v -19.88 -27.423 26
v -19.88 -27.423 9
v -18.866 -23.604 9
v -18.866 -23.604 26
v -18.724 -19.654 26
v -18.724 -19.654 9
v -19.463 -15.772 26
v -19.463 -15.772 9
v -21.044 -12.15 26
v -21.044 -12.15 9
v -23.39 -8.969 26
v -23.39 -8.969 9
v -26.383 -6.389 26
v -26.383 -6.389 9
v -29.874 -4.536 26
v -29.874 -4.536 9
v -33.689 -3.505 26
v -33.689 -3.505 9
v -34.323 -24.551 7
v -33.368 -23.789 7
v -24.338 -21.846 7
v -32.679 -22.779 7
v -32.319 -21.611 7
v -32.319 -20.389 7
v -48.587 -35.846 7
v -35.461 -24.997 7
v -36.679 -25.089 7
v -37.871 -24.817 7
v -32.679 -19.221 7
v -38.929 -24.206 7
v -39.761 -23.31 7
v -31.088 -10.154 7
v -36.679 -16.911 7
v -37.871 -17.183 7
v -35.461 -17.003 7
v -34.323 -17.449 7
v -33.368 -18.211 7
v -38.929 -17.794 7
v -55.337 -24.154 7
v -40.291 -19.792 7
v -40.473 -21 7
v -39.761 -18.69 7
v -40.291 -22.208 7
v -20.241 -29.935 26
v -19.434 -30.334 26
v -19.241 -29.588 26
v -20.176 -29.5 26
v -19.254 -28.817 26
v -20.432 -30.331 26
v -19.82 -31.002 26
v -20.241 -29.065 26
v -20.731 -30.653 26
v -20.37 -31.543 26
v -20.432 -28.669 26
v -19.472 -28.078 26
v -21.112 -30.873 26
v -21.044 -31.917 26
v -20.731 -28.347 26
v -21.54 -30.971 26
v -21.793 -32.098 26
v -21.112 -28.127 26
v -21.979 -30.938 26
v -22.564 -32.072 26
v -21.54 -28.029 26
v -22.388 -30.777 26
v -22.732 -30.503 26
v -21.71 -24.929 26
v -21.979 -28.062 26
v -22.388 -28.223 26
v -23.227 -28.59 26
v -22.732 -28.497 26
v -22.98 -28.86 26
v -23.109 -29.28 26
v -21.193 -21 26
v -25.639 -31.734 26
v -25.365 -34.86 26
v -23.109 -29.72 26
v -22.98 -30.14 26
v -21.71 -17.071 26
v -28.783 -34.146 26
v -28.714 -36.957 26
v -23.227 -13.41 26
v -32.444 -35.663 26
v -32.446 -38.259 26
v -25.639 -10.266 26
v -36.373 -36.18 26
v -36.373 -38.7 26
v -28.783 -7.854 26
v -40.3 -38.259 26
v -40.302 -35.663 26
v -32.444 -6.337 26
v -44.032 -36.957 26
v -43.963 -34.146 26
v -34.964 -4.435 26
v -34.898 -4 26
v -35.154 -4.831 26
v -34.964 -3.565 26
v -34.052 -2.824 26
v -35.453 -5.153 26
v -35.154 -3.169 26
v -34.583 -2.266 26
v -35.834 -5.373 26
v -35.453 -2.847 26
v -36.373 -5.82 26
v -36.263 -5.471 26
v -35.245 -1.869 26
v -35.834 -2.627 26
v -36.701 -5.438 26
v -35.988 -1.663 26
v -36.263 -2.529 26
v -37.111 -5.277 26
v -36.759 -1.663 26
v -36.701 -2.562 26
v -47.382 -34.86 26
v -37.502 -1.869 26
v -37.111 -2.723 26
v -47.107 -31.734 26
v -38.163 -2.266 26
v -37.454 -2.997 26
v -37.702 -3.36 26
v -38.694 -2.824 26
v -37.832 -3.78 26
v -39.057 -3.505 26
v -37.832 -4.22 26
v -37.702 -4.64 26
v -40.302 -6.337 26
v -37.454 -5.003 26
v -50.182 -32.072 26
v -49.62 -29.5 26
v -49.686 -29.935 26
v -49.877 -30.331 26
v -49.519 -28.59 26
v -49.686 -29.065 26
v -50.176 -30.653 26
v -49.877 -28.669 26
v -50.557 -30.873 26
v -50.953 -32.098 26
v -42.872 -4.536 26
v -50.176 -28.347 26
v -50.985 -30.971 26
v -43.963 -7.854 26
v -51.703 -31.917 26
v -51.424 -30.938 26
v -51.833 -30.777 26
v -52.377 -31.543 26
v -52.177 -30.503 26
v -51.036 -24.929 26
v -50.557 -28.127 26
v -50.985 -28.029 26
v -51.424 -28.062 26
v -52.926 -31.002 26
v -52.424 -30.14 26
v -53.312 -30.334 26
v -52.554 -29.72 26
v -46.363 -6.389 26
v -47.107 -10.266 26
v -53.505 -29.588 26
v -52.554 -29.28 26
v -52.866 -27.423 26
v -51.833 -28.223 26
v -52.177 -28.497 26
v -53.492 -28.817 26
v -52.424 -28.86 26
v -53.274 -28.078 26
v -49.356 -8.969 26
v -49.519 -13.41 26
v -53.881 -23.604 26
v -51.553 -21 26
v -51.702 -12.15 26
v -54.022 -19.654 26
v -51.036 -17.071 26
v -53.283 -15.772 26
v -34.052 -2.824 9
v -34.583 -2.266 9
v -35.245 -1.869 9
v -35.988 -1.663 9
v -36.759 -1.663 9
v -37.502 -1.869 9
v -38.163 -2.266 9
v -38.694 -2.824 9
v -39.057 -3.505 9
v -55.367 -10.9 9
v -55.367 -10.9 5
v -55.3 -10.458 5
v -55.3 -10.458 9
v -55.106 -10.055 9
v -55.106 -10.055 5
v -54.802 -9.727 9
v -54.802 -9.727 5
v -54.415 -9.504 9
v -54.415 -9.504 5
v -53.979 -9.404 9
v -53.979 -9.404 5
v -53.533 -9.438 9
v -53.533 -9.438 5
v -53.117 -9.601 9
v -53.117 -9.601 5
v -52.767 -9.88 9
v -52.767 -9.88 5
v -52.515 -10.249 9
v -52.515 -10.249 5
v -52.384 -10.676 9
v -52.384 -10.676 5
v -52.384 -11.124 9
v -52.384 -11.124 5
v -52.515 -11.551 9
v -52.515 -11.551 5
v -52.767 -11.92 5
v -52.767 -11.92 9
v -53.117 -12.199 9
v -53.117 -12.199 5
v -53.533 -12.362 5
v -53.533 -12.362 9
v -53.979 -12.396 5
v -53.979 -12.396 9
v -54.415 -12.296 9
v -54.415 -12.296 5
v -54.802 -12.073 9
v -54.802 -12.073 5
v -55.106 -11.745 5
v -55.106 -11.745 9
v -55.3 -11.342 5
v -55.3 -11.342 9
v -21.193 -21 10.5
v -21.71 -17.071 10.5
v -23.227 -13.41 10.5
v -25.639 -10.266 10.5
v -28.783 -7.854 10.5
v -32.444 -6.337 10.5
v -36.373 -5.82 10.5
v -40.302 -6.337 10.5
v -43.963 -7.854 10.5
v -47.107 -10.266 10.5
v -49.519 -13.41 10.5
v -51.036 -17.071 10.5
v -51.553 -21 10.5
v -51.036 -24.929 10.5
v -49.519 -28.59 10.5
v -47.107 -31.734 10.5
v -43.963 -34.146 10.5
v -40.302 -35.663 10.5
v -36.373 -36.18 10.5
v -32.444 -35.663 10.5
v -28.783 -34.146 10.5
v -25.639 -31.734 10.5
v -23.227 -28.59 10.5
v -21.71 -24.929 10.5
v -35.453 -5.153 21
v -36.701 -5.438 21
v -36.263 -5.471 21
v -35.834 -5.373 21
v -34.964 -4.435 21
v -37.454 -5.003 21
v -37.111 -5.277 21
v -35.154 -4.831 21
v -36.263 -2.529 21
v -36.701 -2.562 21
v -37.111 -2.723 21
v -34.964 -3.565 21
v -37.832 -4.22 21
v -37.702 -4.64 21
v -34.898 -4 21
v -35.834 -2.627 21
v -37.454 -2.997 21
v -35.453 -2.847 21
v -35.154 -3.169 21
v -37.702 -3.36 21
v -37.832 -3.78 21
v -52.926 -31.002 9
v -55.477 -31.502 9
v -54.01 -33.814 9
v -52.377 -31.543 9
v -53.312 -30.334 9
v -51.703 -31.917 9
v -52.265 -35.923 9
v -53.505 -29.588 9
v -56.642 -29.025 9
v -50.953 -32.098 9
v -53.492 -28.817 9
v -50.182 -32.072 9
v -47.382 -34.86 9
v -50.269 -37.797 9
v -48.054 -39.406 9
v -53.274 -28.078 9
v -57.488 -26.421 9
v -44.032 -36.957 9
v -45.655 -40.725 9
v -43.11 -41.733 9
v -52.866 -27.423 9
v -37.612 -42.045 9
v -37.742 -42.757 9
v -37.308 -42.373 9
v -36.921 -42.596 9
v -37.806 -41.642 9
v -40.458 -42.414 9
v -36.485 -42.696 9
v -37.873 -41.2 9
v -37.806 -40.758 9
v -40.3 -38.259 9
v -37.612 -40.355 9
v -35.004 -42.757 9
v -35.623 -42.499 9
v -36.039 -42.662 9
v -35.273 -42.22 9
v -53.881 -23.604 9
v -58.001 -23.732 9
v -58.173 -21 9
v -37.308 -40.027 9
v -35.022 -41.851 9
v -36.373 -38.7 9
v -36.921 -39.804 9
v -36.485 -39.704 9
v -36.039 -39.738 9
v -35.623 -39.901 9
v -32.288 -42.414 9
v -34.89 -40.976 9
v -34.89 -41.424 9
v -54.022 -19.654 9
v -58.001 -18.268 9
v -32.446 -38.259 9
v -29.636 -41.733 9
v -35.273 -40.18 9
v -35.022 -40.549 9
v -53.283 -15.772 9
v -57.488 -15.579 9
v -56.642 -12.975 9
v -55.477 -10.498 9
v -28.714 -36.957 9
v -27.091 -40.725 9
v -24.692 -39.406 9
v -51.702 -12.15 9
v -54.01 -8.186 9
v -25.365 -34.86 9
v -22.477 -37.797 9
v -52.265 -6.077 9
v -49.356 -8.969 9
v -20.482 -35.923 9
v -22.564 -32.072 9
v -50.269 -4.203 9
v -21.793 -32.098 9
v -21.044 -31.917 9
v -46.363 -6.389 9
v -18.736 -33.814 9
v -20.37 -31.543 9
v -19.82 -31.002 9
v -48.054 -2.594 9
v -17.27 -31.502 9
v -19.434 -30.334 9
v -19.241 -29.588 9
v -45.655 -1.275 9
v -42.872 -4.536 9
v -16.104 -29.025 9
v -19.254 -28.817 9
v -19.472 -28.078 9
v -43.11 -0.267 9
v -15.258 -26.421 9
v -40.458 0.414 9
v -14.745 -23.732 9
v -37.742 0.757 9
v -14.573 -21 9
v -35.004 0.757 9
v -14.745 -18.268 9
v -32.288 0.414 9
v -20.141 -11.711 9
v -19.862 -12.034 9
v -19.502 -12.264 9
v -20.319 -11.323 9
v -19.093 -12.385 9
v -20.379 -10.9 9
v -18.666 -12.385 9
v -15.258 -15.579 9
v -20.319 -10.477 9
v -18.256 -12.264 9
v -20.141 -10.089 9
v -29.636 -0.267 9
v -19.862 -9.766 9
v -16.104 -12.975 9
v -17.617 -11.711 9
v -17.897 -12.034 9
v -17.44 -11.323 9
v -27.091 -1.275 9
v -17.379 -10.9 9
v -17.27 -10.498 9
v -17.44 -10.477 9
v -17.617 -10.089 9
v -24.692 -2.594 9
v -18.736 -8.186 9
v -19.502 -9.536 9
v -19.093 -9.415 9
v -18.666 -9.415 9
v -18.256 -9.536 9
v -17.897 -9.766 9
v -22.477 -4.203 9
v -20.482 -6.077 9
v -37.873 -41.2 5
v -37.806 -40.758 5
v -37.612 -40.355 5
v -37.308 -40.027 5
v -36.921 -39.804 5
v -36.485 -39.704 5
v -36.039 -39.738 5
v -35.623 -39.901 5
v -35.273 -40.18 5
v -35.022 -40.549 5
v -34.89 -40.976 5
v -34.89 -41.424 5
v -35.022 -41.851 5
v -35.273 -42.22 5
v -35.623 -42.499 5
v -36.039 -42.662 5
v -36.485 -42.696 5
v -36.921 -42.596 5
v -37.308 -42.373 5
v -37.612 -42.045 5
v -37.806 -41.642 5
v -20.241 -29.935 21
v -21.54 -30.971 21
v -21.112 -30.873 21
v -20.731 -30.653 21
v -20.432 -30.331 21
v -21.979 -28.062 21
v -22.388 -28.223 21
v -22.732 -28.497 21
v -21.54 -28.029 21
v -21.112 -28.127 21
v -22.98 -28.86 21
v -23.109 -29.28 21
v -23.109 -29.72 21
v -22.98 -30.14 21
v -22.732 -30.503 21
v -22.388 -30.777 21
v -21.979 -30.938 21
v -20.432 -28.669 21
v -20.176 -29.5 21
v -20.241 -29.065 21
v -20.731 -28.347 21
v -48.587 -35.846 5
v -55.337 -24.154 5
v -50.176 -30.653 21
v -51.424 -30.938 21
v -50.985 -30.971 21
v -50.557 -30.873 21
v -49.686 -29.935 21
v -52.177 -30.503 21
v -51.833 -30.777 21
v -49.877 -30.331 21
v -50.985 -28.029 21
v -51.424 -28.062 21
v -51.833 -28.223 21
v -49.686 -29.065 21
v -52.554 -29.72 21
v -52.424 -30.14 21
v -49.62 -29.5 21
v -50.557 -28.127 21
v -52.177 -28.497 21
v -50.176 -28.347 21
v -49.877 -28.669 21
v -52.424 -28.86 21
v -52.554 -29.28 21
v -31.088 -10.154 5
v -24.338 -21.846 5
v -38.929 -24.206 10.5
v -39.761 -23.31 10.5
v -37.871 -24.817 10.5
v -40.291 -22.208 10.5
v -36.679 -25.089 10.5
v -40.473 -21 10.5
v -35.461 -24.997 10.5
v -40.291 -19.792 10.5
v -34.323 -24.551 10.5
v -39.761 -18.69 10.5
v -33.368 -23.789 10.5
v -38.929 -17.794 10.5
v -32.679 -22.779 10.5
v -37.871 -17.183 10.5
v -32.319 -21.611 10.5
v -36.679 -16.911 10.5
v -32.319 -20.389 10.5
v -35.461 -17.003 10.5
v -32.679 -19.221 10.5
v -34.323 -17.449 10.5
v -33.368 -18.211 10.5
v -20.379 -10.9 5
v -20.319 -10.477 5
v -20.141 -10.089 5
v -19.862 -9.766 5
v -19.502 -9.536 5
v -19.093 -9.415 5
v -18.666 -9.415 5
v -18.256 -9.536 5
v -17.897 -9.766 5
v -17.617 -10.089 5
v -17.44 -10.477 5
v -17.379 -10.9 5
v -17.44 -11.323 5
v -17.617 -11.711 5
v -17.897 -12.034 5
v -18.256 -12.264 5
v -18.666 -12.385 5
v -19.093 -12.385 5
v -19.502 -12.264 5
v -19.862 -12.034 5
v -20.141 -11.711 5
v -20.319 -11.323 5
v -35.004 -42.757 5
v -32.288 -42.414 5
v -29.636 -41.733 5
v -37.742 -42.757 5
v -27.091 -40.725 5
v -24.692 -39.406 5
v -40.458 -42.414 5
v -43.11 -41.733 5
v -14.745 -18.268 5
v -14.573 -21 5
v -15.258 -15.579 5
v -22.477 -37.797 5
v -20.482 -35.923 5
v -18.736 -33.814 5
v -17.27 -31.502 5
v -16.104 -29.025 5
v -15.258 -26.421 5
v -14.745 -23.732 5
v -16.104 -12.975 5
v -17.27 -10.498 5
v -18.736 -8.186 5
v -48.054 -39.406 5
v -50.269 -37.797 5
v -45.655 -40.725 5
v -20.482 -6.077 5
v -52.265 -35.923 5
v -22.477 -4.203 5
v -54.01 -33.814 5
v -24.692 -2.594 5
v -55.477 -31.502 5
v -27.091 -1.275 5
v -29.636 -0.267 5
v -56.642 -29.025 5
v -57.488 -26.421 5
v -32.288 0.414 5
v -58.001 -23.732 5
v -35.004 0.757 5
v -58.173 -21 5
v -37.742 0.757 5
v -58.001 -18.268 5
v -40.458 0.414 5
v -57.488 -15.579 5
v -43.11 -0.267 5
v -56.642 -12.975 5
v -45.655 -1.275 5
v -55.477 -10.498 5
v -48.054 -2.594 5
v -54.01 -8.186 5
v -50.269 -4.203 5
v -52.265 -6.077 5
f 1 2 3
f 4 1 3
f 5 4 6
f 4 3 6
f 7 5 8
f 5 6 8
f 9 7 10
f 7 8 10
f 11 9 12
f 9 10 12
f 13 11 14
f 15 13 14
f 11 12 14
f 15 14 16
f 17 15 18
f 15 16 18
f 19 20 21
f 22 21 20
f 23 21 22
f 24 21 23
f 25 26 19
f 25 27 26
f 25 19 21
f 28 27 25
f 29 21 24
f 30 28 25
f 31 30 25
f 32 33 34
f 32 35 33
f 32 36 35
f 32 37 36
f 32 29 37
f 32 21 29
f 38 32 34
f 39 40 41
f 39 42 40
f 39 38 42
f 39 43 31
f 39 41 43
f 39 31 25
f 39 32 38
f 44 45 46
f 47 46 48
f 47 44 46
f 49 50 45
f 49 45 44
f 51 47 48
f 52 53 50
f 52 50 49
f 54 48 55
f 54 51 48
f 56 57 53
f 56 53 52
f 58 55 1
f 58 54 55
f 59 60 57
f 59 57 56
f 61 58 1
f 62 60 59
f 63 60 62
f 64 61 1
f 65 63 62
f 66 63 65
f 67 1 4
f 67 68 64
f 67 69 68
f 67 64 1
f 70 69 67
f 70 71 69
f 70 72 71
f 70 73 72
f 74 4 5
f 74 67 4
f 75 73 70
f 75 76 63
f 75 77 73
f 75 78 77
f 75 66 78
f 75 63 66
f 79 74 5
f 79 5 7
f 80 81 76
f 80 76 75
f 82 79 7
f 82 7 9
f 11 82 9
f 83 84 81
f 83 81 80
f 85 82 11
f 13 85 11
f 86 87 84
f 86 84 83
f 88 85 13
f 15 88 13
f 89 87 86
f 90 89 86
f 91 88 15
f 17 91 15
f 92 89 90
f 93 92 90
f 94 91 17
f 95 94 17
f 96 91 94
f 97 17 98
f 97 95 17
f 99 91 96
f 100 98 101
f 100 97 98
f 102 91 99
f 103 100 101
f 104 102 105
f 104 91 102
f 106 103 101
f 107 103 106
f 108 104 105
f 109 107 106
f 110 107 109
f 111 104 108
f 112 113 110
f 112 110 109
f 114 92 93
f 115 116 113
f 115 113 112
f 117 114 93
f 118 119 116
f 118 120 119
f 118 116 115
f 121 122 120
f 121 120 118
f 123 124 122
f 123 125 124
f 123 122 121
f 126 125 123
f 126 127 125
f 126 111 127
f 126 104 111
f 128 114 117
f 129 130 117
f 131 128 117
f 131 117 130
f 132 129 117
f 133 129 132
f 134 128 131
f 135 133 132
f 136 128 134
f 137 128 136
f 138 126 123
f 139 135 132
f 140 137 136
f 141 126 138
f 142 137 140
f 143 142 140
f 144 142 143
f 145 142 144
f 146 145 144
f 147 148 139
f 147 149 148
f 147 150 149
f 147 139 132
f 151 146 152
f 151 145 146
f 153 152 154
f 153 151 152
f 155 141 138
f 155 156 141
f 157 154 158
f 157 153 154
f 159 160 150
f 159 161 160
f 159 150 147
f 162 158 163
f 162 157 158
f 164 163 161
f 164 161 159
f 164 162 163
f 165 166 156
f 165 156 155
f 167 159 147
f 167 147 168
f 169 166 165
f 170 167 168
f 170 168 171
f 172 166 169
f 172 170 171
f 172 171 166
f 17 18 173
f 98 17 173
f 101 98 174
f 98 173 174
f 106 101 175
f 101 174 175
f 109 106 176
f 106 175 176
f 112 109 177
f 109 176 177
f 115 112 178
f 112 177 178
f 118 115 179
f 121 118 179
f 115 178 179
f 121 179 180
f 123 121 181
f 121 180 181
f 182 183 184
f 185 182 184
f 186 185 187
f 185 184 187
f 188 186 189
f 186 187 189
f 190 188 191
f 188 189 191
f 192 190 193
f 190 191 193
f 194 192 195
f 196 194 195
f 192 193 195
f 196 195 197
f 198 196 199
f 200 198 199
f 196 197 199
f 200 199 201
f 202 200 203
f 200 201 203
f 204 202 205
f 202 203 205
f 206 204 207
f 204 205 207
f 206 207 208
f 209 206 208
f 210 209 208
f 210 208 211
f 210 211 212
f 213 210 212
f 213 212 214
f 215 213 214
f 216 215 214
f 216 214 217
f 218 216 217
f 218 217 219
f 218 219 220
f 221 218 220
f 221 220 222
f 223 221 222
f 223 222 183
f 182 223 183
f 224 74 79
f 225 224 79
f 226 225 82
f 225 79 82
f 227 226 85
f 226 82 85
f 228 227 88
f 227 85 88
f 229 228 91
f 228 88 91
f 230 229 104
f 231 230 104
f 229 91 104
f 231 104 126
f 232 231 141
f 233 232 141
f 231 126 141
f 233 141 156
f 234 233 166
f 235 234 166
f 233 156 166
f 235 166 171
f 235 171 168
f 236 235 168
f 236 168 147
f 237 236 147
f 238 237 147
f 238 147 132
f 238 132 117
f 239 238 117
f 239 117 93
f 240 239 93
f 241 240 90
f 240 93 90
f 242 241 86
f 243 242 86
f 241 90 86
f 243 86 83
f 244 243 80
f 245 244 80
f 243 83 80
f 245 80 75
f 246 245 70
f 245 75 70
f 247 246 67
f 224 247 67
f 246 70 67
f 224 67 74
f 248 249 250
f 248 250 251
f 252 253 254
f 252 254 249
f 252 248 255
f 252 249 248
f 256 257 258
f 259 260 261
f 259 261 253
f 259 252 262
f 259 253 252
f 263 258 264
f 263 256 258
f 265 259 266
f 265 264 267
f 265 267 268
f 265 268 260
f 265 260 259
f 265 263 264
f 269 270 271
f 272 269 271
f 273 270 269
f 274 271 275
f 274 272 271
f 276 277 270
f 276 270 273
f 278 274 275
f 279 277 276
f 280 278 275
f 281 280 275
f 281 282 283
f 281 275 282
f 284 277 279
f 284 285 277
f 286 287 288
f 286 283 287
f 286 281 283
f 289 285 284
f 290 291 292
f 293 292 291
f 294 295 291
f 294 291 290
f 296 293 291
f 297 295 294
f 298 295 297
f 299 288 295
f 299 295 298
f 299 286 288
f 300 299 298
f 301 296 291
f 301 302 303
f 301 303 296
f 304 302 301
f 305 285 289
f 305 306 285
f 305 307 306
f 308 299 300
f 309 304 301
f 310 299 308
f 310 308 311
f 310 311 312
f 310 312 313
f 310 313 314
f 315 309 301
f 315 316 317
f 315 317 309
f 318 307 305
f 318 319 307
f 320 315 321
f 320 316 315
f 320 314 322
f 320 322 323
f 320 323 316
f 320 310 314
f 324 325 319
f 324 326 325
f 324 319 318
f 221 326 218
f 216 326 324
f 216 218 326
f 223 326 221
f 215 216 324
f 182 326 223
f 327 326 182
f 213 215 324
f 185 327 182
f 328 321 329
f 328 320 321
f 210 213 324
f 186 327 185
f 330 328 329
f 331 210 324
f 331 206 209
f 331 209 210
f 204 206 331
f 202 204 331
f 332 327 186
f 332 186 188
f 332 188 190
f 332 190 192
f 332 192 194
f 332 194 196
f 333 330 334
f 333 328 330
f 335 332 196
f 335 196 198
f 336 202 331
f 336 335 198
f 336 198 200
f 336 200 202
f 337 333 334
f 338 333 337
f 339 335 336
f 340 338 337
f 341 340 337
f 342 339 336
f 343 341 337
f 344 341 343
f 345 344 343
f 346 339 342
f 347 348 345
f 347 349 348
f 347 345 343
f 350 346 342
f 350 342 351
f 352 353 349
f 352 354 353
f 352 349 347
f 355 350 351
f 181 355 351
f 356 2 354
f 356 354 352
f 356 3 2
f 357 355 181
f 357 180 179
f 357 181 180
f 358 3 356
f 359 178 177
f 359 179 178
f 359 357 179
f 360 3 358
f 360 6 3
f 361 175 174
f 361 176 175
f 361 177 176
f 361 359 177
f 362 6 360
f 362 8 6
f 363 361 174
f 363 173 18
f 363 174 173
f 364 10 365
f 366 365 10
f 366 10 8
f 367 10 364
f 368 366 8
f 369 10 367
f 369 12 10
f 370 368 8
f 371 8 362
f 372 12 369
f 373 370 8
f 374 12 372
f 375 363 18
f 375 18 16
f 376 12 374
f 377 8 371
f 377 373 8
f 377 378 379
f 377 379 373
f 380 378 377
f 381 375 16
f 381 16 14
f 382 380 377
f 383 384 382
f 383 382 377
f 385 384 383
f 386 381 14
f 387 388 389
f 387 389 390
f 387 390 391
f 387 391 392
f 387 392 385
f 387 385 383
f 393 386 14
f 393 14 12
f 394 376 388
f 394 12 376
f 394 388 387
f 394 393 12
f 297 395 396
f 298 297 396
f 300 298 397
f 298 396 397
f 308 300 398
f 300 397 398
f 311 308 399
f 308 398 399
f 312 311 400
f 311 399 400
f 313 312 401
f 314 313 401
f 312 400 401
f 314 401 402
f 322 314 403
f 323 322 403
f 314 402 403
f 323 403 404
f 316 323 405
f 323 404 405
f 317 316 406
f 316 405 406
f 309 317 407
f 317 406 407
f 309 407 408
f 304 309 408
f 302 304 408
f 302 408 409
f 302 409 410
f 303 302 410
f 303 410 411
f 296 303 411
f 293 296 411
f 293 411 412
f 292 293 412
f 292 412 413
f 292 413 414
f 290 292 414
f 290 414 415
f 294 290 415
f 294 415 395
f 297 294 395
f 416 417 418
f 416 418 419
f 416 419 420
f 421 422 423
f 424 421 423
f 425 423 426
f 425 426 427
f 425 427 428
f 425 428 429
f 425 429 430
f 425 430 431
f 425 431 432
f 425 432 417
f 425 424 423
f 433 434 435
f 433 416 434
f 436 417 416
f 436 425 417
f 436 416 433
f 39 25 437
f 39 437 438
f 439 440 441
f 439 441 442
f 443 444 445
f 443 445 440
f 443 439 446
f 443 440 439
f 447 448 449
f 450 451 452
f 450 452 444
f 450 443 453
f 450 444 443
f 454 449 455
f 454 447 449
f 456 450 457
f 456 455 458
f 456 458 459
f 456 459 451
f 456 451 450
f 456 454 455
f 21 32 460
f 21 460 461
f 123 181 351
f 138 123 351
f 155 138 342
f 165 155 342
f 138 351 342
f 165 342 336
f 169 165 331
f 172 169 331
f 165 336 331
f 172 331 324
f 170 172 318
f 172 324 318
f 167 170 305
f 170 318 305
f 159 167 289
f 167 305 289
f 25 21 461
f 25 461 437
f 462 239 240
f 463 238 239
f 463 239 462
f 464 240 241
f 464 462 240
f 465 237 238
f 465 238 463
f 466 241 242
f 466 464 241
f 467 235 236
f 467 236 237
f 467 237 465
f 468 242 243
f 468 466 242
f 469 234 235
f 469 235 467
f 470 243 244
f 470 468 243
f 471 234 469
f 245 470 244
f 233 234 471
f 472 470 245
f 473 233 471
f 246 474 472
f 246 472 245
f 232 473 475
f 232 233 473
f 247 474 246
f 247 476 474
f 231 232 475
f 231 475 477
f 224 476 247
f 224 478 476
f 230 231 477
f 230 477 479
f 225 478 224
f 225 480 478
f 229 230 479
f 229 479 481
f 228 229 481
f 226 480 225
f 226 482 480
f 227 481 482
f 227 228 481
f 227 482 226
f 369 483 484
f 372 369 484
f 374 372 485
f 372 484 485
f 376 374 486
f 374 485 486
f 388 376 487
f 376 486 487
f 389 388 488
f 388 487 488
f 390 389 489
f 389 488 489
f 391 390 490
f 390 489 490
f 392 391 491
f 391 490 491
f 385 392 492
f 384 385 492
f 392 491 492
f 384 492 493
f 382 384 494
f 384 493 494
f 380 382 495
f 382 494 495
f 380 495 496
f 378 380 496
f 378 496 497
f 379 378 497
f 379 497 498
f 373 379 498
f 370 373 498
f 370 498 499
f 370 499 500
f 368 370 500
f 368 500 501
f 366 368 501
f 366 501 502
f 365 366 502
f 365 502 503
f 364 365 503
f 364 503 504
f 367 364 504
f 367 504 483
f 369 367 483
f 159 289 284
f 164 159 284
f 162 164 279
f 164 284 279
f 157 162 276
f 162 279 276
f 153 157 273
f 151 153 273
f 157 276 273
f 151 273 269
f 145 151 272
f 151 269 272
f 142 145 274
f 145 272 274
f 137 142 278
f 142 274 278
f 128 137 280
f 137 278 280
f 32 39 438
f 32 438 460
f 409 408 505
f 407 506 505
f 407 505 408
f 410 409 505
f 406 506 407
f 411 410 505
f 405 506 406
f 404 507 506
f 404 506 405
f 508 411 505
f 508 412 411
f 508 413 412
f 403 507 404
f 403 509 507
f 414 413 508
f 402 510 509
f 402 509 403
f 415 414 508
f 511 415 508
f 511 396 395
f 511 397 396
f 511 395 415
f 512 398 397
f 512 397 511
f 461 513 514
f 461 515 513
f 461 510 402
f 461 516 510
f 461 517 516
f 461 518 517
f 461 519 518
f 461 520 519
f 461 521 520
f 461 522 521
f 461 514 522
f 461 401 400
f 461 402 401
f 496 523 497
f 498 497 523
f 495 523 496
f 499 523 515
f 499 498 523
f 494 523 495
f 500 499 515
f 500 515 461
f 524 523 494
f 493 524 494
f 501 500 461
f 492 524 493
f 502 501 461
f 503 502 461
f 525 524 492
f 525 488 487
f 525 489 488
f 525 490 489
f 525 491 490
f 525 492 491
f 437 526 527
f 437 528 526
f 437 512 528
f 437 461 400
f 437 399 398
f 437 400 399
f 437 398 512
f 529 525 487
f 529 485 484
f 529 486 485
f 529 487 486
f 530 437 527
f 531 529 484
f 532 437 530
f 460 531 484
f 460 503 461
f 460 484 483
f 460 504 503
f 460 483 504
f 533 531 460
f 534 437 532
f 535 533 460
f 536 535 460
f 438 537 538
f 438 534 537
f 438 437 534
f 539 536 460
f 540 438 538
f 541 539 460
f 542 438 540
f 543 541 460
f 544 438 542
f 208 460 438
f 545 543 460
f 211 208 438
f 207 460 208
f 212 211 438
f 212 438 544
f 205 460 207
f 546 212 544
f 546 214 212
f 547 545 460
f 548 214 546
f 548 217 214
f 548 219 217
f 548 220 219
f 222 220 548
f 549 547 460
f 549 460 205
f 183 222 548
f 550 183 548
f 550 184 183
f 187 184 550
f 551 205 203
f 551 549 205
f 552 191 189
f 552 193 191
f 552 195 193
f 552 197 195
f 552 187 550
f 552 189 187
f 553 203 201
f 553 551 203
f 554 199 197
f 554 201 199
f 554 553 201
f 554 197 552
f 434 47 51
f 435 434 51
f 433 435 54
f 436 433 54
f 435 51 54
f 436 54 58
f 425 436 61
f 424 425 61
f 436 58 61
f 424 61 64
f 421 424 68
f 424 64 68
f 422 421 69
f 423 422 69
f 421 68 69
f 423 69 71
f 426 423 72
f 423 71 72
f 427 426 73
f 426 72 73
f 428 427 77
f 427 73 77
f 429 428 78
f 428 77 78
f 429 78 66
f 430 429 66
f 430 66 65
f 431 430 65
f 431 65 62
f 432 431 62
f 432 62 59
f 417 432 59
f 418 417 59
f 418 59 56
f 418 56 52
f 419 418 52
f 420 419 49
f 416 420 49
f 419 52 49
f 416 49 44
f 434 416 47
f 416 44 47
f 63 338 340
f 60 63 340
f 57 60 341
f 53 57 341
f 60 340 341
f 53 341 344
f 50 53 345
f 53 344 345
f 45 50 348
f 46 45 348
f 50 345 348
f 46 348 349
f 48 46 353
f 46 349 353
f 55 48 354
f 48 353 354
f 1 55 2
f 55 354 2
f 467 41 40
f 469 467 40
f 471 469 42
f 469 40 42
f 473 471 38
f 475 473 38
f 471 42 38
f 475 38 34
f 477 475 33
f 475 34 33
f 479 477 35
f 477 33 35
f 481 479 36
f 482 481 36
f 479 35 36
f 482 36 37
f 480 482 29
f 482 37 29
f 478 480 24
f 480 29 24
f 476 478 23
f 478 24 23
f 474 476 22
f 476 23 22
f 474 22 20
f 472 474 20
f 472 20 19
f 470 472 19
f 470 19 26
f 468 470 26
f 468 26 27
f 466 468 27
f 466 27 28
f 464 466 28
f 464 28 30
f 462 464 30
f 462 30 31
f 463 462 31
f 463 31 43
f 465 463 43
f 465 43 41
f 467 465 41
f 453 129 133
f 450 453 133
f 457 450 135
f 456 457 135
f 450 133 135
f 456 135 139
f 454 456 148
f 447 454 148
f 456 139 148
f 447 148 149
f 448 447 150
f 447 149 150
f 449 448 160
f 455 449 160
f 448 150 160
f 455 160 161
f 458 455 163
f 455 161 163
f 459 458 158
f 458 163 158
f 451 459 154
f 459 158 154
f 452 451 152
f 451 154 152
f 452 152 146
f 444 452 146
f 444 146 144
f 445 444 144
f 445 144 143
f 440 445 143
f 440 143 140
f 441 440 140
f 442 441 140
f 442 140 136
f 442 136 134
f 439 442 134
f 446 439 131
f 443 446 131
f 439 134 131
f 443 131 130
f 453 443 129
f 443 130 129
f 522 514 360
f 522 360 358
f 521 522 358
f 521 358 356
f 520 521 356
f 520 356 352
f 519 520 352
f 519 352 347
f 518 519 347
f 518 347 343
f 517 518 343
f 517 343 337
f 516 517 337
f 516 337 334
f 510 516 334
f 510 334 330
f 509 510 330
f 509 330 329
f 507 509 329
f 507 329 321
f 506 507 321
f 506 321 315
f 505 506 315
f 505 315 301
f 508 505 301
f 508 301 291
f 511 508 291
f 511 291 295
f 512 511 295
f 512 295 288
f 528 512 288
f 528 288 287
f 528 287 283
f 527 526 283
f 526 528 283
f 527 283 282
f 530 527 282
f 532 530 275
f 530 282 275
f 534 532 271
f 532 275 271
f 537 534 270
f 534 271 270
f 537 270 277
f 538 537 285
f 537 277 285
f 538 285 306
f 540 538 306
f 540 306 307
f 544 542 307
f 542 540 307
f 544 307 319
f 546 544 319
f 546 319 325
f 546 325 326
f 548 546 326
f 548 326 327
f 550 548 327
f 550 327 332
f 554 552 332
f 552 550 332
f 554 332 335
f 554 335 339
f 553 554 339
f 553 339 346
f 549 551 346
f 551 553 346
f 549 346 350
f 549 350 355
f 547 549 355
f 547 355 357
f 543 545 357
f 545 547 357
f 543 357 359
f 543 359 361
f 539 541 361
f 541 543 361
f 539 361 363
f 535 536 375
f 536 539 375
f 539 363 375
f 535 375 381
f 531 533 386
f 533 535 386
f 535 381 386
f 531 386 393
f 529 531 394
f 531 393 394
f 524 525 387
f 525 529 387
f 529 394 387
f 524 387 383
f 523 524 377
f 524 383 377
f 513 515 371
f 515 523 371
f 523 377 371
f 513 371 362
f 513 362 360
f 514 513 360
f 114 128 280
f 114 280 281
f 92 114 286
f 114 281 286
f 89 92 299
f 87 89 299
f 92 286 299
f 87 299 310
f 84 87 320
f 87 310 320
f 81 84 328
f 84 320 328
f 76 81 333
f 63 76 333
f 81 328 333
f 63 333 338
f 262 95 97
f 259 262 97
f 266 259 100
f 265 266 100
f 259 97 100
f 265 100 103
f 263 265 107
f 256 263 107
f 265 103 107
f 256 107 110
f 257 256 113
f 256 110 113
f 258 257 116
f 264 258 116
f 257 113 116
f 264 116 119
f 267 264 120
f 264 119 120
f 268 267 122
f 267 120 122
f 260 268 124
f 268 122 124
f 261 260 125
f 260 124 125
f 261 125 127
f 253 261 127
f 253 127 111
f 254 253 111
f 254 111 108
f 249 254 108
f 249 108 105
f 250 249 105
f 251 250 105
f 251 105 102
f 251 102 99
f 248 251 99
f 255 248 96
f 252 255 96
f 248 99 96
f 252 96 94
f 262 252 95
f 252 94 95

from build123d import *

# Parameters (mm, degrees)
SKETCH_1_R           = 20
SKETCH_1_R_2         = 15.75
EXTRUDE_1_DEPTH      = 5
EXTRUDE_2_DEPTH      = 8
SKETCH_3_R           = 18
EXTRUDE_3_DEPTH      = 13
EXTRUDE_6_DEPTH      = 8
SKETCH_4_R           = 15
CUT_EXTRUDE_1_DEPTH  = 15.5
SKETCH_7_R           = 3
CUT_EXTRUDE_2_DEPTH  = 10
EXTRUDE_7_REACH      = 92.44
SKETCH_9_R           = 1.475
CUT_EXTRUDE_3_DEPTH  = 5
SKETCH_10_W          = 1.475
SKETCH_10_H          = 47.880376143
SKETCH_11_W          = 47.783072431
SKETCH_11_H          = 1.475
CUT_EXTRUDE_START    = -2
SKETCH_12_R          = 3
CUT_EXTRUDE_4_DEPTH  = 2
SKETCH_13_R          = 15.15
SKETCH_13_R_2        = 15.25
SKETCH_13_R_3        = 15.18
CUT_EXTRUDE_5_DEPTH  = 15.5
SKETCH_14_R          = 15.75
CUT_EXTRUDE_6_DEPTH  = 8
CUT_EXTRUDE_START_2  = -17
SKETCH_15_R          = 110.73530619
CUT_EXTRUDE_8_DEPTH  = 17
SKETCH_16_R          = 128.173460151
SKETCH_16_R_2        = 21.8
CUT_EXTRUDE_10_DEPTH = 9
SKETCH_18_R          = 4.1
CUT_EXTRUDE_12_DEPTH = 10
SKETCH_19_R          = 1.5
CUT_EXTRUDE_14_DEPTH = 10


with BuildPart() as part:
    # 草图1 → 凸台-拉伸1 (new body)
    with BuildSketch(Plane.XY):
        Circle(SKETCH_1_R)
        Circle(SKETCH_1_R_2, mode=Mode.SUBTRACT)
    extrude(amount=EXTRUDE_1_DEPTH)

    # 草图2 → 凸台-拉伸2 (add)
    with BuildSketch(Plane.XY.offset(5)):
        with BuildLine():
            ThreePointArc((0, -25.892443989), (42.435244785, -24.5), (22.423514261, 12.946221995))
            ThreePointArc((22.423514261, 12.946221995), (0, 49), (-22.423514261, 12.946221995))
            ThreePointArc((-22.423514261, 12.946221995), (-42.435244785, -24.5), (0, -25.892443989))
        make_face()
    extrude(amount=EXTRUDE_2_DEPTH)

    # 草图3 → 凸台-拉伸3 (add)
    with BuildSketch(Plane.XY.offset(13)):
        with Locations(Location((0, 42, 0), (0, 0, 182.034073739))):
            Circle(SKETCH_3_R)
        with Locations(Location((36.373066959, -21, 0), (0, 0, 237.965926261))):
            Circle(SKETCH_3_R)
        with Locations(Location((-36.373066959, -21, 0), (0, 0, 117.965926261))):
            Circle(SKETCH_3_R)
    extrude(amount=EXTRUDE_3_DEPTH)

    # 草图8 → 凸台-拉伸6 (add)
    with BuildSketch(Plane(origin=(0, 0, 5), x_dir=(-1, 0, 0), z_dir=(0, 0, -1))):
        with BuildLine():
            ThreePointArc((28.527895654, -41.553668461), (55.425625842, -32), (50.250480335, -3.929048123))
            ThreePointArc((50.250480335, -3.929048123), (31.431769398, 18.147140523), (21.72258468, 45.482716583))
            ThreePointArc((21.72258468, 45.482716583), (0, 64), (-21.72258468, 45.482716583))
            ThreePointArc((-21.72258468, 45.482716583), (-31.431769398, 18.147140523), (-50.250480335, -3.929048123))
            ThreePointArc((-50.250480335, -3.929048123), (-55.425625842, -32), (-28.527895654, -41.553668461))
            ThreePointArc((-28.527895654, -41.553668461), (0, -36.294281046), (28.527895654, -41.553668461))
        make_face()
        with BuildLine():
            ThreePointArc((22.423514261, 12.946221995), (42.435244785, -24.5), (0, -25.892443989))
            ThreePointArc((0, -25.892443989), (-42.435244785, -24.5), (-22.423514261, 12.946221995))
            ThreePointArc((-22.423514261, 12.946221995), (0, 49), (22.423514261, 12.946221995))
        make_face(mode=Mode.SUBTRACT)
    extrude(amount=-EXTRUDE_6_DEPTH)

    # 草图4 → 切除-拉伸1 (cut)
    with BuildSketch(Plane.XY.offset(26)):
        with Locations((0, 42)):
            Circle(SKETCH_4_R)
        with Locations((36.373066959, -21)):
            Circle(SKETCH_4_R)
        with Locations((-36.373066959, -21)):
            Circle(SKETCH_4_R)
    extrude(amount=-CUT_EXTRUDE_1_DEPTH, mode=Mode.SUBTRACT)

    # 草图7 → 切除-拉伸2 (cut)
    with BuildSketch(Plane.XY.offset(10.5)):
        with Locations((0, 42)):
            Circle(SKETCH_7_R)
        with Locations((36.373066959, -21)):
            Circle(SKETCH_7_R)
        with Locations((-36.373066959, -21)):
            Circle(SKETCH_7_R)
    extrude(amount=-CUT_EXTRUDE_2_DEPTH, mode=Mode.SUBTRACT)

    # 草图6 → 凸台-拉伸7 (add, up to next)
    with BuildSketch(Plane.XY.offset(26), mode=Mode.PRIVATE) as extrude_7_sk1:
        with BuildLine():
            ThreePointArc((2.644358031, 56.765072658), (0, 61.66268909), (-2.644358031, 56.765072658))
            ThreePointArc((-2.644358031, 56.765072658), (0, 57), (2.644358031, 56.765072658))
        make_face()
    extrude_7_tool1 = extrude(extrude_7_sk1.sketch, amount=-EXTRUDE_7_REACH, mode=Mode.PRIVATE) - part.part
    # 草图6 → 凸台-拉伸7 (add, up to next)
    with BuildSketch(Plane.XY.offset(26), mode=Mode.PRIVATE) as extrude_7_sk2:
        with BuildLine():
            ThreePointArc((11.464748995, 32.327382439), (17.028388258, 32.168655455), (14.109107026, 36.907544902))
            ThreePointArc((14.109107026, 36.907544902), (12.990381057, 34.5), (11.464748995, 32.327382439))
        make_face()
    extrude_7_tool2 = extrude(extrude_7_sk2.sketch, amount=-EXTRUDE_7_REACH, mode=Mode.PRIVATE) - part.part
    # 草图6 → 凸台-拉伸7 (add, up to next)
    with BuildSketch(Plane.XY.offset(26), mode=Mode.PRIVATE) as extrude_7_sk3:
        with BuildLine():
            ThreePointArc((-14.109107026, 36.907544902), (-17.028388258, 32.168655455), (-11.464748995, 32.327382439))
            ThreePointArc((-11.464748995, 32.327382439), (-12.990381057, 34.5), (-14.109107026, 36.907544902))
        make_face()
    extrude_7_tool3 = extrude(extrude_7_sk3.sketch, amount=-EXTRUDE_7_REACH, mode=Mode.PRIVATE) - part.part
    # 草图6 → 凸台-拉伸7 (add, up to next)
    with BuildSketch(Plane.XY.offset(26), mode=Mode.PRIVATE) as extrude_7_sk4:
        with BuildLine():
            ThreePointArc((47.837815954, -30.672617561), (53.401455217, -30.831344545), (50.482173985, -26.092455098))
            ThreePointArc((50.482173985, -26.092455098), (49.363448016, -28.5), (47.837815954, -30.672617561))
        make_face()
    extrude_7_tool4 = extrude(extrude_7_sk4.sketch, amount=-EXTRUDE_7_REACH, mode=Mode.PRIVATE) - part.part
    # 草图6 → 凸台-拉伸7 (add, up to next)
    with BuildSketch(Plane.XY.offset(26), mode=Mode.PRIVATE) as extrude_7_sk5:
        with BuildLine():
            ThreePointArc((22.263959933, -26.092455098), (19.344678701, -30.831344545), (24.908317964, -30.672617561))
            ThreePointArc((24.908317964, -30.672617561), (23.382685902, -28.5), (22.263959933, -26.092455098))
        make_face()
    extrude_7_tool5 = extrude(extrude_7_sk5.sketch, amount=-EXTRUDE_7_REACH, mode=Mode.PRIVATE) - part.part
    # 草图6 → 凸台-拉伸7 (add, up to next)
    with BuildSketch(Plane.XY.offset(26), mode=Mode.PRIVATE) as extrude_7_sk6:
        with BuildLine():
            ThreePointArc((39.01742499, -6.234927342), (36.373066959, -1.33731091), (33.728708928, -6.234927342))
            ThreePointArc((33.728708928, -6.234927342), (36.373066959, -6), (39.01742499, -6.234927342))
        make_face()
    extrude_7_tool6 = extrude(extrude_7_sk6.sketch, amount=-EXTRUDE_7_REACH, mode=Mode.PRIVATE) - part.part
    # 草图6 → 凸台-拉伸7 (add, up to next)
    with BuildSketch(Plane.XY.offset(26), mode=Mode.PRIVATE) as extrude_7_sk7:
        with BuildLine():
            ThreePointArc((-50.482173985, -26.092455098), (-53.401455217, -30.831344545), (-47.837815954, -30.672617561))
            ThreePointArc((-47.837815954, -30.672617561), (-49.363448016, -28.5), (-50.482173985, -26.092455098))
        make_face()
    extrude_7_tool7 = extrude(extrude_7_sk7.sketch, amount=-EXTRUDE_7_REACH, mode=Mode.PRIVATE) - part.part
    # 草图6 → 凸台-拉伸7 (add, up to next)
    with BuildSketch(Plane.XY.offset(26), mode=Mode.PRIVATE) as extrude_7_sk8:
        with BuildLine():
            ThreePointArc((-33.728708928, -6.234927342), (-36.373066959, -1.33731091), (-39.01742499, -6.234927342))
            ThreePointArc((-39.01742499, -6.234927342), (-36.373066959, -6), (-33.728708928, -6.234927342))
        make_face()
    extrude_7_tool8 = extrude(extrude_7_sk8.sketch, amount=-EXTRUDE_7_REACH, mode=Mode.PRIVATE) - part.part
    # 草图6 → 凸台-拉伸7 (add, up to next)
    with BuildSketch(Plane.XY.offset(26), mode=Mode.PRIVATE) as extrude_7_sk9:
        with BuildLine():
            ThreePointArc((-24.908317964, -30.672617561), (-19.344678701, -30.831344545), (-22.263959933, -26.092455098))
            ThreePointArc((-22.263959933, -26.092455098), (-23.382685902, -28.5), (-24.908317964, -30.672617561))
        make_face()
    extrude_7_tool9 = extrude(extrude_7_sk9.sketch, amount=-EXTRUDE_7_REACH, mode=Mode.PRIVATE) - part.part
    add(extrude_7_tool1.solids().sort_by_distance((0, 59.041522, 26))[0])
    add(extrude_7_tool2.solids().sort_by_distance((14.758391, 33.479239, 26))[0])
    add(extrude_7_tool3.solids().sort_by_distance((-14.758391, 33.479239, 26))[0])
    add(extrude_7_tool4.solids().sort_by_distance((51.131457, -29.520761, 26))[0])
    add(extrude_7_tool5.solids().sort_by_distance((21.614676, -29.520761, 26))[0])
    add(extrude_7_tool6.solids().sort_by_distance((36.373067, -3.958478, 26))[0])
    add(extrude_7_tool7.solids().sort_by_distance((-51.131457, -29.520761, 26))[0])
    add(extrude_7_tool8.solids().sort_by_distance((-36.373067, -3.958478, 26))[0])
    add(extrude_7_tool9.solids().sort_by_distance((-21.614676, -29.520761, 26))[0])

    # 草图9 → 切除-拉伸3 (cut)
    with BuildSketch(Plane.XY.offset(26)):
        with Locations((0, 59)):
            Circle(SKETCH_9_R)
        with Locations((14.722431864, 33.5)):
            Circle(SKETCH_9_R)
        with Locations((-14.722431864, 33.5)):
            Circle(SKETCH_9_R)
        with Locations((51.095498823, -29.5)):
            Circle(SKETCH_9_R)
        with Locations((21.650635095, -29.5)):
            Circle(SKETCH_9_R)
        with Locations((36.373066959, -4)):
            Circle(SKETCH_9_R)
        with Locations((-51.095498823, -29.5)):
            Circle(SKETCH_9_R)
        with Locations((-36.373066959, -4)):
            Circle(SKETCH_9_R)
        with Locations((-21.650635095, -29.5)):
            Circle(SKETCH_9_R)
    extrude(amount=-CUT_EXTRUDE_3_DEPTH, mode=Mode.SUBTRACT)

    # 草图10 → 切除-旋转1 (revolve, cut)
    with BuildSketch(Plane(origin=(0, 0, 2.5), x_dir=(-1, 0, 0), z_dir=(0, 0, -1)), mode=Mode.PRIVATE) as cut_revolve_1_sk:
        with Locations((0.7375, -0.269128361)):
            Rectangle(SKETCH_10_W, SKETCH_10_H)
    revolve(cut_revolve_1_sk.sketch.rotate(Axis((0, 26.597082696, 2.5), (0, -1, 0)), 270), axis=Axis((0, 26.597082696, 2.5), (0, -1, 0)), mode=Mode.SUBTRACT)

    # 草图11 → 切除-旋转2 (revolve, cut)
    with BuildSketch(Plane(origin=(0, 0, 2.5), x_dir=(-1, 0, 0), z_dir=(0, 0, -1)), mode=Mode.PRIVATE) as cut_revolve_2_sk:
        with Locations((0.227220258, 0.7375)):
            Rectangle(SKETCH_11_W, SKETCH_11_H)
    revolve(cut_revolve_2_sk.sketch.rotate(Axis((35.344622551, 0, 2.5), (-1, 0, 0)), 90), axis=Axis((35.344622551, 0, 2.5), (-1, 0, 0)), mode=Mode.SUBTRACT)

    # 草图12 → 切除-拉伸4 (cut)
    # profile 1 of 3: a face of its own
    with BuildSketch(Plane(origin=(0, 0, 5), x_dir=(-1, 0, 0), z_dir=(0, 0, -1)).offset(CUT_EXTRUDE_START)):
        Polygon((-6.75, 32), (0, 32), (6.75, 32), (6.75, 60), (-6.75, 60), align=None)
        with Locations(Location((0, 42, 0), (0, 0, 180))):
            Circle(SKETCH_12_R, mode=Mode.SUBTRACT)
    # profile 2 of 3: a face of its own
    with BuildSketch(Plane(origin=(0, 0, 5), x_dir=(-1, 0, 0), z_dir=(0, 0, -1)).offset(CUT_EXTRUDE_START)):
        Polygon((-31.087812921, -10.154328524), (-55.336524227, -24.154328524), (-48.586524227, -35.845671476), (-24.337812921, -21.845671476), (-27.712812921, -16), align=None)
        with Locations(Location((-36.373066959, -21, 0), (0, 0, 180))):
            Circle(SKETCH_12_R, mode=Mode.SUBTRACT)
    # profile 3 of 3: a face of its own
    with BuildSketch(Plane(origin=(0, 0, 5), x_dir=(-1, 0, 0), z_dir=(0, 0, -1)).offset(CUT_EXTRUDE_START)):
        Polygon((24.337812921, -21.845671476), (48.586524227, -35.845671476), (55.336524227, -24.154328524), (31.087812921, -10.154328524), (27.712812921, -16), align=None)
        with Locations(Location((36.373066959, -21, 0), (0, 0, 180))):
            Circle(SKETCH_12_R, mode=Mode.SUBTRACT)
    extrude(amount=CUT_EXTRUDE_4_DEPTH, mode=Mode.SUBTRACT)

    # 草图13 → 切除-拉伸5 (cut)
    with BuildSketch(Plane.XY.offset(26)):
        with Locations((0, 42)):
            Circle(SKETCH_13_R)
        with Locations((36.373066959, -21)):
            Circle(SKETCH_13_R_2)
        with Locations((-36.373066959, -21)):
            Circle(SKETCH_13_R_3)
    extrude(amount=-CUT_EXTRUDE_5_DEPTH, mode=Mode.SUBTRACT)

    # 草图14 → 切除-拉伸6 (cut)
    with BuildSketch(Plane(origin=(0, 0, 5), x_dir=(-1, 0, 0), z_dir=(0, 0, -1))):
        with Locations(Location((0, 0, 0), (0, 0, 180))):
            Circle(SKETCH_14_R)
    extrude(amount=-CUT_EXTRUDE_6_DEPTH, mode=Mode.SUBTRACT)

    # 草图15 → 切除-拉伸8 (cut)
    with BuildSketch(Plane.XY.offset(26).offset(CUT_EXTRUDE_START_2)):
        with Locations((-36.373066959, -21)):
            Circle(SKETCH_15_R)
        with BuildLine():
            ThreePointArc((-39.057160852, -3.504696631), (-51.701716606, -12.15), (-52.86649107, -27.423158187))
            ThreePointArc((-52.86649107, -27.423158187), (-53.141647596, -30.681344545), (-50.182397177, -32.072145182))
            ThreePointArc((-50.182397177, -32.072145182), (-36.373066959, -38.7), (-22.563736741, -32.072145182))
            ThreePointArc((-22.563736741, -32.072145182), (-19.604486322, -30.681344545), (-19.879642848, -27.423158187))
            ThreePointArc((-19.879642848, -27.423158187), (-21.044417312, -12.15), (-33.688973066, -3.504696631))
            ThreePointArc((-33.688973066, -3.504696631), (-36.373066959, -1.63731091), (-39.057160852, -3.504696631))
        make_face(mode=Mode.SUBTRACT)
    extrude(amount=CUT_EXTRUDE_8_DEPTH, mode=Mode.SUBTRACT)

    # 草图16 → 切除-拉伸10 (cut)
    with BuildSketch(Plane(origin=(0, 0, 9), x_dir=(-1, 0, 0), z_dir=(0, 0, -1))):
        with Locations((36.373066959, -21)):
            Circle(SKETCH_16_R)
        with Locations(Location((36.373066959, -21, 0), (0, 0, 180))):
            Circle(SKETCH_16_R_2, mode=Mode.SUBTRACT)
    extrude(amount=CUT_EXTRUDE_10_DEPTH, mode=Mode.SUBTRACT)

    # 草图18 → 切除-拉伸12 (cut)
    with BuildSketch(Plane(origin=(0, 0, 7), x_dir=(-1, 0, 0), z_dir=(0, 0, -1))):
        with Locations((36.373066959, -21)):
            Circle(SKETCH_18_R)
    extrude(amount=-CUT_EXTRUDE_12_DEPTH, mode=Mode.SUBTRACT)

    # 草图19 → 切除-拉伸14 (cut)
    with BuildSketch(Plane(origin=(0, 0, 5), x_dir=(-1, 0, 0), z_dir=(0, 0, -1))):
        with Locations((36.373066959, -41.2)):
            Circle(SKETCH_19_R)
        with Locations((18.879353802, -10.9)):
            Circle(SKETCH_19_R)
        with Locations((53.866780115, -10.9)):
            Circle(SKETCH_19_R)
    extrude(amount=-CUT_EXTRUDE_14_DEPTH, mode=Mode.SUBTRACT)


solid = part.part
